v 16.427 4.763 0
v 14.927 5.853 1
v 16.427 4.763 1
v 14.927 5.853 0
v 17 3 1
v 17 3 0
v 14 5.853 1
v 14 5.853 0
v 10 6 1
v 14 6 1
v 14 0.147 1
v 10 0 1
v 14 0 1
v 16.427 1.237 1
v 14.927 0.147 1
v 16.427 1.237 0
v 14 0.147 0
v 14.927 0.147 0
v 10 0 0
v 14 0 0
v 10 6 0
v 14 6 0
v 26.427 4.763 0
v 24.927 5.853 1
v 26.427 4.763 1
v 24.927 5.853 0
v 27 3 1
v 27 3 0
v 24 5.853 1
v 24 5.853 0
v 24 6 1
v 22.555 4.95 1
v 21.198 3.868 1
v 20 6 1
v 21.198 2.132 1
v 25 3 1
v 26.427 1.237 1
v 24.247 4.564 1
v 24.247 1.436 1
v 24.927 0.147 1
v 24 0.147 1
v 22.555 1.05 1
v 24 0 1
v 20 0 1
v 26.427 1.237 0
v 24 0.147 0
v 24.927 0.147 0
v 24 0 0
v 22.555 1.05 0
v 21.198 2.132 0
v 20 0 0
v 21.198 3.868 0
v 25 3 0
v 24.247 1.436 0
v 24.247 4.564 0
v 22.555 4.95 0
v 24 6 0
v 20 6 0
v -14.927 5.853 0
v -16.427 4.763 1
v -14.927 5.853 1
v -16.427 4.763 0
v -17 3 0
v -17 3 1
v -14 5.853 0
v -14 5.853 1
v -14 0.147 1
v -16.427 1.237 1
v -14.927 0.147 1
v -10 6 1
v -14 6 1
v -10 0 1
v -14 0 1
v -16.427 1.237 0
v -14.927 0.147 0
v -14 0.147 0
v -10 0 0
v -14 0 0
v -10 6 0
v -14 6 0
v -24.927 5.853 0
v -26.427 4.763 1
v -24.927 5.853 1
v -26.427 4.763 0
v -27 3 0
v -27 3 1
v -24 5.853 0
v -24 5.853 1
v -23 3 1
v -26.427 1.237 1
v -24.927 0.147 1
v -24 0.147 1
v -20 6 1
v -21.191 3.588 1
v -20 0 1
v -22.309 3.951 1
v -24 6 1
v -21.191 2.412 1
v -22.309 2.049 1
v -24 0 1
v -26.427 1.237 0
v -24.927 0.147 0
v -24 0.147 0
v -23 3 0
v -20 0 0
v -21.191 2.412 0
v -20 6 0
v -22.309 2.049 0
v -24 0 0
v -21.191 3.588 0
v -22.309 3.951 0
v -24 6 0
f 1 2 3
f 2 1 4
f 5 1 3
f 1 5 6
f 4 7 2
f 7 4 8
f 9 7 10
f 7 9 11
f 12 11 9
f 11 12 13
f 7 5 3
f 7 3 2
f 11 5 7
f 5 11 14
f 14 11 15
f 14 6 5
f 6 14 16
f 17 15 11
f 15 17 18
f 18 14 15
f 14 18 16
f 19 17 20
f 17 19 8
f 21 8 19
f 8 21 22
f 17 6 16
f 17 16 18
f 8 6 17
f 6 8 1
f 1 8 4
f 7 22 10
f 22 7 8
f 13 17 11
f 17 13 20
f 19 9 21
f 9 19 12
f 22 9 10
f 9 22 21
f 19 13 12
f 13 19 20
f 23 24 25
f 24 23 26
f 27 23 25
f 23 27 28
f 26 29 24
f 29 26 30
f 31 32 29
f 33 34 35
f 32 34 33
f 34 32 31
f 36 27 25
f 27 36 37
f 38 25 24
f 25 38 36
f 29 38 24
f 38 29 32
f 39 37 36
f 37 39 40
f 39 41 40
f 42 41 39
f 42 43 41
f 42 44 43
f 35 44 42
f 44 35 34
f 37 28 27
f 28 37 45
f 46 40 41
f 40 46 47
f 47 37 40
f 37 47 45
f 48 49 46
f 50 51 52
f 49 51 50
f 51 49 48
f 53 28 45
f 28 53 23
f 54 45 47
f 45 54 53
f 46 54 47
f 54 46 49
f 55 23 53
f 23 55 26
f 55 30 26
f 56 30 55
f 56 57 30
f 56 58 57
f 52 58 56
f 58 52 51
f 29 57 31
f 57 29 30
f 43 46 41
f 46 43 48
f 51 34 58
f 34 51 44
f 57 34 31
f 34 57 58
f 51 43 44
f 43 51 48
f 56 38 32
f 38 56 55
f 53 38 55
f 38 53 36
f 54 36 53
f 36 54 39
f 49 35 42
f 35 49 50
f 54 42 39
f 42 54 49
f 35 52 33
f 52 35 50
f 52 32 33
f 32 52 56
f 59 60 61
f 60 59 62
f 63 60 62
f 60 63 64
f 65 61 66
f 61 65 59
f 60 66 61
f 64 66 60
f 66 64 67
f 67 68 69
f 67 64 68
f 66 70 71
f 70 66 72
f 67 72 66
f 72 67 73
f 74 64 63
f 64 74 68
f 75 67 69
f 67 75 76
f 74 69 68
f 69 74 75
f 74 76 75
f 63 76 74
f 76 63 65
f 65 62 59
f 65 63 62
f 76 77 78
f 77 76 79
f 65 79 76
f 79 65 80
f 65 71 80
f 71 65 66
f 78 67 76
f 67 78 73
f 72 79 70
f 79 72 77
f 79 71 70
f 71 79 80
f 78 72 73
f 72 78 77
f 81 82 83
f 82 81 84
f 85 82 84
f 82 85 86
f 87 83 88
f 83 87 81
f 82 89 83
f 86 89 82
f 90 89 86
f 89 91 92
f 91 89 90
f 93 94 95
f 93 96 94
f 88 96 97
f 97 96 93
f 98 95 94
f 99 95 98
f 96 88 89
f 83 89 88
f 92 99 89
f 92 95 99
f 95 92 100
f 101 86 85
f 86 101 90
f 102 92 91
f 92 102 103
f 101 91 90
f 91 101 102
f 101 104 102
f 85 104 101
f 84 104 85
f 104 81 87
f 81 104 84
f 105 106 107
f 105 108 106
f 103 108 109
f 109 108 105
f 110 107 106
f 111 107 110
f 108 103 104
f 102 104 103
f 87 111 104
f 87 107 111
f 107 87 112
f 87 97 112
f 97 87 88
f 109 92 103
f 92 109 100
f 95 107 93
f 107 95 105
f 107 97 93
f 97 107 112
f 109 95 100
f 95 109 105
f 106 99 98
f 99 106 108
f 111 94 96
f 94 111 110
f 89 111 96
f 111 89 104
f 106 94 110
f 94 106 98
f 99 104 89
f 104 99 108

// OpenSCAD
// file: myCylinder.scad
// Copyright Stephen Morrisson 2017
// All rights reserved

// rh Cent Cylinder
// rh Cylinder
use <myCube.scad>

module rhCentCylinder(c, rRadius, z)
{
    color(c) cylinder(h=z, r=rRadius, center=false);
}
translate([-15, -15, 0]) rhCentCylinder("red", 3, 2);

module rhCylinder(c, rRadius, z)
{
    translate([rRadius, rRadius, 0]) rhCentCylinder(c, rRadius, z);
}
translate([-15, 15, 0]) rhCylinder("blue", 2, 3);

module transCylinder(c, xO, yO, zO, rRadius, z)
{
    translate([xO, yO, zO]) rhCylinder(c, rRadius, z);
}
//transCylinder("red", 0,0,0, 4, 1);
transCylinder("green", 15, 15, 0, 2, 2);

module centRightCylinder(c, rRadius, z)
{
    rD = rRadius * 3.0;
    difference()
    {
        rhCentCylinder(c, rRadius, z);
        transCube(c, -rD, -rRadius, -rRadius,  rD, rD, rD);
    }
}
centRightCylinder("green", 2, 2);

module rightHalfCylinder(c, xO, yO, zO, rRadius, z)
{
    translate([xO, yO + rRadius, zO]) centRightCylinder(c, rRadius, z);
}
rightHalfCylinder("yellow", 10, 0, 0, 2, 1);

module leftHalfCylinder(c, xO, yO, zO, rRadius, z)
{
    translate([xO + rRadius, yO + rRadius, zO])
        rotate([0,0,180]) centRightCylinder(c, rRadius, z);
}
leftHalfCylinder("yellow", -10, 0, 0, 2, 1);

module topHalfCylinder(c, xO, yO, zO, rRadius, z)
{
    translate([xO + rRadius, yO, zO])
        rotate([0,0,90]) centRightCylinder(c, rRadius, z);
}
topHalfCylinder("yellow", 0, 10, 0, 2, 1);

module bottomHalfCylinder(c, xO, yO, zO, rRadius, z)
{
    translate([xO + rRadius, yO + rRadius, zO])
        rotate([0,0,270]) centRightCylinder(c, rRadius, z);
}
bottomHalfCylinder("yellow", 0, -10, 0, 2, 1);
// file: myCube.scad
// Copyright Stephen Morrisson 2017
// All rights reserved

// {xyz, rot, trans, tr} Cube

module xyzCube(c, x, y, z)
{
    color(c) cube([x, y, z], false);
}

module rotCube(c, rotX, rotY, rotZ, x, y, z)
{
    rotate([rotX, rotY, rotZ]) xyzCube(c, x, y, z);
}
translate([-15, 15, 0,])rotCube("green", 45, 45, 45, 2,2,2);

module transCube(c, xOffset, yOffset, zOffset, x, y, z)
{
    translate([xOffset, yOffset, zOffset]) xyzCube(c, x, y, z);
}
transCube("brown", -15, -15, 0, 3, 2, 1);


module trCube(c, rotX, rotY, rotZ, xO, yO, zO, x, y, z)
{
    translate([xO, yO, zO])
    rotate([rotX, rotY, rotZ])
    xyzCube(c, x, y, z);
}
//trCube("yellow", 0,0,0, 0,0,0, 2, 3, 4);
//trCube("green", 45, 45, 45, 4, 3, 1, 5, 6, 7);
//trCube("blue", 0, 0, 45, 20, 0, 0, 5, 6, 7);
trCube("orange", 0,0,0, -10, 0, 0, 1,1,1);
//trCube("orange", 45,0,0, -15, 0, 0, 1,1,1);
//trCube("orange", 0,45,0, -20, 0, 0, 1,1,1);
//trCube("orange", 0,0,45, -25, 0, 0, 1,1,1);
// main file
// Copyright Stephen Morrisson 2017
// All rights reserved

// Tab Flang

use <myCube.scad>
use <myCylinder.scad>

module rightSimpleTab(c, rRadius, z, xSpacer)
{
    yD = 2.0 * rRadius;
    xyzCube(c, xSpacer, yD, z);
    rightHalfCylinder(c, xSpacer, 0, 0, rRadius, z);
}

module rightTab(c, xO, yO, zO, rRadius, z, xSpacer)
{
    translate([xO, yO, zO])
    {
        rightSimpleTab(c, rRadius, z, xSpacer);
    }
}
rightTab("blue", 10, 0, 0, 3, 1, 4);

module rightFlang(c, xO, yO, zO, rRadius, z, xSpacer, rHole)
{
    rMid = rRadius - rHole;
    difference()
    {
        rightTab(c, xO, yO, zO, rRadius, z, xSpacer);
        transCylinder(c, xO + xSpacer - rRadius, yO + rMid, zO -1,
            rHole, z + 2.0); 
    }
}
rightFlang("green", 20,0,0, 3, 1, 4, 2);

module leftTab(c, xO, yO, zO, rRadius, z, xSpacer)
{
    mirror([1, 0, 0]) rightTab(c, -xO, yO, zO, rRadius, z, xSpacer);
}
leftTab("blue", -10,0,0, 3, 1, 4);

module leftFlang(c, xO, yO, zO, rRadius, z, xSpacer, rHole)
{
    mirror([1, 0, 0])
        rightFlang(c, -xO, yO, zO, rRadius, z, xSpacer, rHole);
}
leftFlang("green", -20,0,0, 3, 1, 4, 1);
